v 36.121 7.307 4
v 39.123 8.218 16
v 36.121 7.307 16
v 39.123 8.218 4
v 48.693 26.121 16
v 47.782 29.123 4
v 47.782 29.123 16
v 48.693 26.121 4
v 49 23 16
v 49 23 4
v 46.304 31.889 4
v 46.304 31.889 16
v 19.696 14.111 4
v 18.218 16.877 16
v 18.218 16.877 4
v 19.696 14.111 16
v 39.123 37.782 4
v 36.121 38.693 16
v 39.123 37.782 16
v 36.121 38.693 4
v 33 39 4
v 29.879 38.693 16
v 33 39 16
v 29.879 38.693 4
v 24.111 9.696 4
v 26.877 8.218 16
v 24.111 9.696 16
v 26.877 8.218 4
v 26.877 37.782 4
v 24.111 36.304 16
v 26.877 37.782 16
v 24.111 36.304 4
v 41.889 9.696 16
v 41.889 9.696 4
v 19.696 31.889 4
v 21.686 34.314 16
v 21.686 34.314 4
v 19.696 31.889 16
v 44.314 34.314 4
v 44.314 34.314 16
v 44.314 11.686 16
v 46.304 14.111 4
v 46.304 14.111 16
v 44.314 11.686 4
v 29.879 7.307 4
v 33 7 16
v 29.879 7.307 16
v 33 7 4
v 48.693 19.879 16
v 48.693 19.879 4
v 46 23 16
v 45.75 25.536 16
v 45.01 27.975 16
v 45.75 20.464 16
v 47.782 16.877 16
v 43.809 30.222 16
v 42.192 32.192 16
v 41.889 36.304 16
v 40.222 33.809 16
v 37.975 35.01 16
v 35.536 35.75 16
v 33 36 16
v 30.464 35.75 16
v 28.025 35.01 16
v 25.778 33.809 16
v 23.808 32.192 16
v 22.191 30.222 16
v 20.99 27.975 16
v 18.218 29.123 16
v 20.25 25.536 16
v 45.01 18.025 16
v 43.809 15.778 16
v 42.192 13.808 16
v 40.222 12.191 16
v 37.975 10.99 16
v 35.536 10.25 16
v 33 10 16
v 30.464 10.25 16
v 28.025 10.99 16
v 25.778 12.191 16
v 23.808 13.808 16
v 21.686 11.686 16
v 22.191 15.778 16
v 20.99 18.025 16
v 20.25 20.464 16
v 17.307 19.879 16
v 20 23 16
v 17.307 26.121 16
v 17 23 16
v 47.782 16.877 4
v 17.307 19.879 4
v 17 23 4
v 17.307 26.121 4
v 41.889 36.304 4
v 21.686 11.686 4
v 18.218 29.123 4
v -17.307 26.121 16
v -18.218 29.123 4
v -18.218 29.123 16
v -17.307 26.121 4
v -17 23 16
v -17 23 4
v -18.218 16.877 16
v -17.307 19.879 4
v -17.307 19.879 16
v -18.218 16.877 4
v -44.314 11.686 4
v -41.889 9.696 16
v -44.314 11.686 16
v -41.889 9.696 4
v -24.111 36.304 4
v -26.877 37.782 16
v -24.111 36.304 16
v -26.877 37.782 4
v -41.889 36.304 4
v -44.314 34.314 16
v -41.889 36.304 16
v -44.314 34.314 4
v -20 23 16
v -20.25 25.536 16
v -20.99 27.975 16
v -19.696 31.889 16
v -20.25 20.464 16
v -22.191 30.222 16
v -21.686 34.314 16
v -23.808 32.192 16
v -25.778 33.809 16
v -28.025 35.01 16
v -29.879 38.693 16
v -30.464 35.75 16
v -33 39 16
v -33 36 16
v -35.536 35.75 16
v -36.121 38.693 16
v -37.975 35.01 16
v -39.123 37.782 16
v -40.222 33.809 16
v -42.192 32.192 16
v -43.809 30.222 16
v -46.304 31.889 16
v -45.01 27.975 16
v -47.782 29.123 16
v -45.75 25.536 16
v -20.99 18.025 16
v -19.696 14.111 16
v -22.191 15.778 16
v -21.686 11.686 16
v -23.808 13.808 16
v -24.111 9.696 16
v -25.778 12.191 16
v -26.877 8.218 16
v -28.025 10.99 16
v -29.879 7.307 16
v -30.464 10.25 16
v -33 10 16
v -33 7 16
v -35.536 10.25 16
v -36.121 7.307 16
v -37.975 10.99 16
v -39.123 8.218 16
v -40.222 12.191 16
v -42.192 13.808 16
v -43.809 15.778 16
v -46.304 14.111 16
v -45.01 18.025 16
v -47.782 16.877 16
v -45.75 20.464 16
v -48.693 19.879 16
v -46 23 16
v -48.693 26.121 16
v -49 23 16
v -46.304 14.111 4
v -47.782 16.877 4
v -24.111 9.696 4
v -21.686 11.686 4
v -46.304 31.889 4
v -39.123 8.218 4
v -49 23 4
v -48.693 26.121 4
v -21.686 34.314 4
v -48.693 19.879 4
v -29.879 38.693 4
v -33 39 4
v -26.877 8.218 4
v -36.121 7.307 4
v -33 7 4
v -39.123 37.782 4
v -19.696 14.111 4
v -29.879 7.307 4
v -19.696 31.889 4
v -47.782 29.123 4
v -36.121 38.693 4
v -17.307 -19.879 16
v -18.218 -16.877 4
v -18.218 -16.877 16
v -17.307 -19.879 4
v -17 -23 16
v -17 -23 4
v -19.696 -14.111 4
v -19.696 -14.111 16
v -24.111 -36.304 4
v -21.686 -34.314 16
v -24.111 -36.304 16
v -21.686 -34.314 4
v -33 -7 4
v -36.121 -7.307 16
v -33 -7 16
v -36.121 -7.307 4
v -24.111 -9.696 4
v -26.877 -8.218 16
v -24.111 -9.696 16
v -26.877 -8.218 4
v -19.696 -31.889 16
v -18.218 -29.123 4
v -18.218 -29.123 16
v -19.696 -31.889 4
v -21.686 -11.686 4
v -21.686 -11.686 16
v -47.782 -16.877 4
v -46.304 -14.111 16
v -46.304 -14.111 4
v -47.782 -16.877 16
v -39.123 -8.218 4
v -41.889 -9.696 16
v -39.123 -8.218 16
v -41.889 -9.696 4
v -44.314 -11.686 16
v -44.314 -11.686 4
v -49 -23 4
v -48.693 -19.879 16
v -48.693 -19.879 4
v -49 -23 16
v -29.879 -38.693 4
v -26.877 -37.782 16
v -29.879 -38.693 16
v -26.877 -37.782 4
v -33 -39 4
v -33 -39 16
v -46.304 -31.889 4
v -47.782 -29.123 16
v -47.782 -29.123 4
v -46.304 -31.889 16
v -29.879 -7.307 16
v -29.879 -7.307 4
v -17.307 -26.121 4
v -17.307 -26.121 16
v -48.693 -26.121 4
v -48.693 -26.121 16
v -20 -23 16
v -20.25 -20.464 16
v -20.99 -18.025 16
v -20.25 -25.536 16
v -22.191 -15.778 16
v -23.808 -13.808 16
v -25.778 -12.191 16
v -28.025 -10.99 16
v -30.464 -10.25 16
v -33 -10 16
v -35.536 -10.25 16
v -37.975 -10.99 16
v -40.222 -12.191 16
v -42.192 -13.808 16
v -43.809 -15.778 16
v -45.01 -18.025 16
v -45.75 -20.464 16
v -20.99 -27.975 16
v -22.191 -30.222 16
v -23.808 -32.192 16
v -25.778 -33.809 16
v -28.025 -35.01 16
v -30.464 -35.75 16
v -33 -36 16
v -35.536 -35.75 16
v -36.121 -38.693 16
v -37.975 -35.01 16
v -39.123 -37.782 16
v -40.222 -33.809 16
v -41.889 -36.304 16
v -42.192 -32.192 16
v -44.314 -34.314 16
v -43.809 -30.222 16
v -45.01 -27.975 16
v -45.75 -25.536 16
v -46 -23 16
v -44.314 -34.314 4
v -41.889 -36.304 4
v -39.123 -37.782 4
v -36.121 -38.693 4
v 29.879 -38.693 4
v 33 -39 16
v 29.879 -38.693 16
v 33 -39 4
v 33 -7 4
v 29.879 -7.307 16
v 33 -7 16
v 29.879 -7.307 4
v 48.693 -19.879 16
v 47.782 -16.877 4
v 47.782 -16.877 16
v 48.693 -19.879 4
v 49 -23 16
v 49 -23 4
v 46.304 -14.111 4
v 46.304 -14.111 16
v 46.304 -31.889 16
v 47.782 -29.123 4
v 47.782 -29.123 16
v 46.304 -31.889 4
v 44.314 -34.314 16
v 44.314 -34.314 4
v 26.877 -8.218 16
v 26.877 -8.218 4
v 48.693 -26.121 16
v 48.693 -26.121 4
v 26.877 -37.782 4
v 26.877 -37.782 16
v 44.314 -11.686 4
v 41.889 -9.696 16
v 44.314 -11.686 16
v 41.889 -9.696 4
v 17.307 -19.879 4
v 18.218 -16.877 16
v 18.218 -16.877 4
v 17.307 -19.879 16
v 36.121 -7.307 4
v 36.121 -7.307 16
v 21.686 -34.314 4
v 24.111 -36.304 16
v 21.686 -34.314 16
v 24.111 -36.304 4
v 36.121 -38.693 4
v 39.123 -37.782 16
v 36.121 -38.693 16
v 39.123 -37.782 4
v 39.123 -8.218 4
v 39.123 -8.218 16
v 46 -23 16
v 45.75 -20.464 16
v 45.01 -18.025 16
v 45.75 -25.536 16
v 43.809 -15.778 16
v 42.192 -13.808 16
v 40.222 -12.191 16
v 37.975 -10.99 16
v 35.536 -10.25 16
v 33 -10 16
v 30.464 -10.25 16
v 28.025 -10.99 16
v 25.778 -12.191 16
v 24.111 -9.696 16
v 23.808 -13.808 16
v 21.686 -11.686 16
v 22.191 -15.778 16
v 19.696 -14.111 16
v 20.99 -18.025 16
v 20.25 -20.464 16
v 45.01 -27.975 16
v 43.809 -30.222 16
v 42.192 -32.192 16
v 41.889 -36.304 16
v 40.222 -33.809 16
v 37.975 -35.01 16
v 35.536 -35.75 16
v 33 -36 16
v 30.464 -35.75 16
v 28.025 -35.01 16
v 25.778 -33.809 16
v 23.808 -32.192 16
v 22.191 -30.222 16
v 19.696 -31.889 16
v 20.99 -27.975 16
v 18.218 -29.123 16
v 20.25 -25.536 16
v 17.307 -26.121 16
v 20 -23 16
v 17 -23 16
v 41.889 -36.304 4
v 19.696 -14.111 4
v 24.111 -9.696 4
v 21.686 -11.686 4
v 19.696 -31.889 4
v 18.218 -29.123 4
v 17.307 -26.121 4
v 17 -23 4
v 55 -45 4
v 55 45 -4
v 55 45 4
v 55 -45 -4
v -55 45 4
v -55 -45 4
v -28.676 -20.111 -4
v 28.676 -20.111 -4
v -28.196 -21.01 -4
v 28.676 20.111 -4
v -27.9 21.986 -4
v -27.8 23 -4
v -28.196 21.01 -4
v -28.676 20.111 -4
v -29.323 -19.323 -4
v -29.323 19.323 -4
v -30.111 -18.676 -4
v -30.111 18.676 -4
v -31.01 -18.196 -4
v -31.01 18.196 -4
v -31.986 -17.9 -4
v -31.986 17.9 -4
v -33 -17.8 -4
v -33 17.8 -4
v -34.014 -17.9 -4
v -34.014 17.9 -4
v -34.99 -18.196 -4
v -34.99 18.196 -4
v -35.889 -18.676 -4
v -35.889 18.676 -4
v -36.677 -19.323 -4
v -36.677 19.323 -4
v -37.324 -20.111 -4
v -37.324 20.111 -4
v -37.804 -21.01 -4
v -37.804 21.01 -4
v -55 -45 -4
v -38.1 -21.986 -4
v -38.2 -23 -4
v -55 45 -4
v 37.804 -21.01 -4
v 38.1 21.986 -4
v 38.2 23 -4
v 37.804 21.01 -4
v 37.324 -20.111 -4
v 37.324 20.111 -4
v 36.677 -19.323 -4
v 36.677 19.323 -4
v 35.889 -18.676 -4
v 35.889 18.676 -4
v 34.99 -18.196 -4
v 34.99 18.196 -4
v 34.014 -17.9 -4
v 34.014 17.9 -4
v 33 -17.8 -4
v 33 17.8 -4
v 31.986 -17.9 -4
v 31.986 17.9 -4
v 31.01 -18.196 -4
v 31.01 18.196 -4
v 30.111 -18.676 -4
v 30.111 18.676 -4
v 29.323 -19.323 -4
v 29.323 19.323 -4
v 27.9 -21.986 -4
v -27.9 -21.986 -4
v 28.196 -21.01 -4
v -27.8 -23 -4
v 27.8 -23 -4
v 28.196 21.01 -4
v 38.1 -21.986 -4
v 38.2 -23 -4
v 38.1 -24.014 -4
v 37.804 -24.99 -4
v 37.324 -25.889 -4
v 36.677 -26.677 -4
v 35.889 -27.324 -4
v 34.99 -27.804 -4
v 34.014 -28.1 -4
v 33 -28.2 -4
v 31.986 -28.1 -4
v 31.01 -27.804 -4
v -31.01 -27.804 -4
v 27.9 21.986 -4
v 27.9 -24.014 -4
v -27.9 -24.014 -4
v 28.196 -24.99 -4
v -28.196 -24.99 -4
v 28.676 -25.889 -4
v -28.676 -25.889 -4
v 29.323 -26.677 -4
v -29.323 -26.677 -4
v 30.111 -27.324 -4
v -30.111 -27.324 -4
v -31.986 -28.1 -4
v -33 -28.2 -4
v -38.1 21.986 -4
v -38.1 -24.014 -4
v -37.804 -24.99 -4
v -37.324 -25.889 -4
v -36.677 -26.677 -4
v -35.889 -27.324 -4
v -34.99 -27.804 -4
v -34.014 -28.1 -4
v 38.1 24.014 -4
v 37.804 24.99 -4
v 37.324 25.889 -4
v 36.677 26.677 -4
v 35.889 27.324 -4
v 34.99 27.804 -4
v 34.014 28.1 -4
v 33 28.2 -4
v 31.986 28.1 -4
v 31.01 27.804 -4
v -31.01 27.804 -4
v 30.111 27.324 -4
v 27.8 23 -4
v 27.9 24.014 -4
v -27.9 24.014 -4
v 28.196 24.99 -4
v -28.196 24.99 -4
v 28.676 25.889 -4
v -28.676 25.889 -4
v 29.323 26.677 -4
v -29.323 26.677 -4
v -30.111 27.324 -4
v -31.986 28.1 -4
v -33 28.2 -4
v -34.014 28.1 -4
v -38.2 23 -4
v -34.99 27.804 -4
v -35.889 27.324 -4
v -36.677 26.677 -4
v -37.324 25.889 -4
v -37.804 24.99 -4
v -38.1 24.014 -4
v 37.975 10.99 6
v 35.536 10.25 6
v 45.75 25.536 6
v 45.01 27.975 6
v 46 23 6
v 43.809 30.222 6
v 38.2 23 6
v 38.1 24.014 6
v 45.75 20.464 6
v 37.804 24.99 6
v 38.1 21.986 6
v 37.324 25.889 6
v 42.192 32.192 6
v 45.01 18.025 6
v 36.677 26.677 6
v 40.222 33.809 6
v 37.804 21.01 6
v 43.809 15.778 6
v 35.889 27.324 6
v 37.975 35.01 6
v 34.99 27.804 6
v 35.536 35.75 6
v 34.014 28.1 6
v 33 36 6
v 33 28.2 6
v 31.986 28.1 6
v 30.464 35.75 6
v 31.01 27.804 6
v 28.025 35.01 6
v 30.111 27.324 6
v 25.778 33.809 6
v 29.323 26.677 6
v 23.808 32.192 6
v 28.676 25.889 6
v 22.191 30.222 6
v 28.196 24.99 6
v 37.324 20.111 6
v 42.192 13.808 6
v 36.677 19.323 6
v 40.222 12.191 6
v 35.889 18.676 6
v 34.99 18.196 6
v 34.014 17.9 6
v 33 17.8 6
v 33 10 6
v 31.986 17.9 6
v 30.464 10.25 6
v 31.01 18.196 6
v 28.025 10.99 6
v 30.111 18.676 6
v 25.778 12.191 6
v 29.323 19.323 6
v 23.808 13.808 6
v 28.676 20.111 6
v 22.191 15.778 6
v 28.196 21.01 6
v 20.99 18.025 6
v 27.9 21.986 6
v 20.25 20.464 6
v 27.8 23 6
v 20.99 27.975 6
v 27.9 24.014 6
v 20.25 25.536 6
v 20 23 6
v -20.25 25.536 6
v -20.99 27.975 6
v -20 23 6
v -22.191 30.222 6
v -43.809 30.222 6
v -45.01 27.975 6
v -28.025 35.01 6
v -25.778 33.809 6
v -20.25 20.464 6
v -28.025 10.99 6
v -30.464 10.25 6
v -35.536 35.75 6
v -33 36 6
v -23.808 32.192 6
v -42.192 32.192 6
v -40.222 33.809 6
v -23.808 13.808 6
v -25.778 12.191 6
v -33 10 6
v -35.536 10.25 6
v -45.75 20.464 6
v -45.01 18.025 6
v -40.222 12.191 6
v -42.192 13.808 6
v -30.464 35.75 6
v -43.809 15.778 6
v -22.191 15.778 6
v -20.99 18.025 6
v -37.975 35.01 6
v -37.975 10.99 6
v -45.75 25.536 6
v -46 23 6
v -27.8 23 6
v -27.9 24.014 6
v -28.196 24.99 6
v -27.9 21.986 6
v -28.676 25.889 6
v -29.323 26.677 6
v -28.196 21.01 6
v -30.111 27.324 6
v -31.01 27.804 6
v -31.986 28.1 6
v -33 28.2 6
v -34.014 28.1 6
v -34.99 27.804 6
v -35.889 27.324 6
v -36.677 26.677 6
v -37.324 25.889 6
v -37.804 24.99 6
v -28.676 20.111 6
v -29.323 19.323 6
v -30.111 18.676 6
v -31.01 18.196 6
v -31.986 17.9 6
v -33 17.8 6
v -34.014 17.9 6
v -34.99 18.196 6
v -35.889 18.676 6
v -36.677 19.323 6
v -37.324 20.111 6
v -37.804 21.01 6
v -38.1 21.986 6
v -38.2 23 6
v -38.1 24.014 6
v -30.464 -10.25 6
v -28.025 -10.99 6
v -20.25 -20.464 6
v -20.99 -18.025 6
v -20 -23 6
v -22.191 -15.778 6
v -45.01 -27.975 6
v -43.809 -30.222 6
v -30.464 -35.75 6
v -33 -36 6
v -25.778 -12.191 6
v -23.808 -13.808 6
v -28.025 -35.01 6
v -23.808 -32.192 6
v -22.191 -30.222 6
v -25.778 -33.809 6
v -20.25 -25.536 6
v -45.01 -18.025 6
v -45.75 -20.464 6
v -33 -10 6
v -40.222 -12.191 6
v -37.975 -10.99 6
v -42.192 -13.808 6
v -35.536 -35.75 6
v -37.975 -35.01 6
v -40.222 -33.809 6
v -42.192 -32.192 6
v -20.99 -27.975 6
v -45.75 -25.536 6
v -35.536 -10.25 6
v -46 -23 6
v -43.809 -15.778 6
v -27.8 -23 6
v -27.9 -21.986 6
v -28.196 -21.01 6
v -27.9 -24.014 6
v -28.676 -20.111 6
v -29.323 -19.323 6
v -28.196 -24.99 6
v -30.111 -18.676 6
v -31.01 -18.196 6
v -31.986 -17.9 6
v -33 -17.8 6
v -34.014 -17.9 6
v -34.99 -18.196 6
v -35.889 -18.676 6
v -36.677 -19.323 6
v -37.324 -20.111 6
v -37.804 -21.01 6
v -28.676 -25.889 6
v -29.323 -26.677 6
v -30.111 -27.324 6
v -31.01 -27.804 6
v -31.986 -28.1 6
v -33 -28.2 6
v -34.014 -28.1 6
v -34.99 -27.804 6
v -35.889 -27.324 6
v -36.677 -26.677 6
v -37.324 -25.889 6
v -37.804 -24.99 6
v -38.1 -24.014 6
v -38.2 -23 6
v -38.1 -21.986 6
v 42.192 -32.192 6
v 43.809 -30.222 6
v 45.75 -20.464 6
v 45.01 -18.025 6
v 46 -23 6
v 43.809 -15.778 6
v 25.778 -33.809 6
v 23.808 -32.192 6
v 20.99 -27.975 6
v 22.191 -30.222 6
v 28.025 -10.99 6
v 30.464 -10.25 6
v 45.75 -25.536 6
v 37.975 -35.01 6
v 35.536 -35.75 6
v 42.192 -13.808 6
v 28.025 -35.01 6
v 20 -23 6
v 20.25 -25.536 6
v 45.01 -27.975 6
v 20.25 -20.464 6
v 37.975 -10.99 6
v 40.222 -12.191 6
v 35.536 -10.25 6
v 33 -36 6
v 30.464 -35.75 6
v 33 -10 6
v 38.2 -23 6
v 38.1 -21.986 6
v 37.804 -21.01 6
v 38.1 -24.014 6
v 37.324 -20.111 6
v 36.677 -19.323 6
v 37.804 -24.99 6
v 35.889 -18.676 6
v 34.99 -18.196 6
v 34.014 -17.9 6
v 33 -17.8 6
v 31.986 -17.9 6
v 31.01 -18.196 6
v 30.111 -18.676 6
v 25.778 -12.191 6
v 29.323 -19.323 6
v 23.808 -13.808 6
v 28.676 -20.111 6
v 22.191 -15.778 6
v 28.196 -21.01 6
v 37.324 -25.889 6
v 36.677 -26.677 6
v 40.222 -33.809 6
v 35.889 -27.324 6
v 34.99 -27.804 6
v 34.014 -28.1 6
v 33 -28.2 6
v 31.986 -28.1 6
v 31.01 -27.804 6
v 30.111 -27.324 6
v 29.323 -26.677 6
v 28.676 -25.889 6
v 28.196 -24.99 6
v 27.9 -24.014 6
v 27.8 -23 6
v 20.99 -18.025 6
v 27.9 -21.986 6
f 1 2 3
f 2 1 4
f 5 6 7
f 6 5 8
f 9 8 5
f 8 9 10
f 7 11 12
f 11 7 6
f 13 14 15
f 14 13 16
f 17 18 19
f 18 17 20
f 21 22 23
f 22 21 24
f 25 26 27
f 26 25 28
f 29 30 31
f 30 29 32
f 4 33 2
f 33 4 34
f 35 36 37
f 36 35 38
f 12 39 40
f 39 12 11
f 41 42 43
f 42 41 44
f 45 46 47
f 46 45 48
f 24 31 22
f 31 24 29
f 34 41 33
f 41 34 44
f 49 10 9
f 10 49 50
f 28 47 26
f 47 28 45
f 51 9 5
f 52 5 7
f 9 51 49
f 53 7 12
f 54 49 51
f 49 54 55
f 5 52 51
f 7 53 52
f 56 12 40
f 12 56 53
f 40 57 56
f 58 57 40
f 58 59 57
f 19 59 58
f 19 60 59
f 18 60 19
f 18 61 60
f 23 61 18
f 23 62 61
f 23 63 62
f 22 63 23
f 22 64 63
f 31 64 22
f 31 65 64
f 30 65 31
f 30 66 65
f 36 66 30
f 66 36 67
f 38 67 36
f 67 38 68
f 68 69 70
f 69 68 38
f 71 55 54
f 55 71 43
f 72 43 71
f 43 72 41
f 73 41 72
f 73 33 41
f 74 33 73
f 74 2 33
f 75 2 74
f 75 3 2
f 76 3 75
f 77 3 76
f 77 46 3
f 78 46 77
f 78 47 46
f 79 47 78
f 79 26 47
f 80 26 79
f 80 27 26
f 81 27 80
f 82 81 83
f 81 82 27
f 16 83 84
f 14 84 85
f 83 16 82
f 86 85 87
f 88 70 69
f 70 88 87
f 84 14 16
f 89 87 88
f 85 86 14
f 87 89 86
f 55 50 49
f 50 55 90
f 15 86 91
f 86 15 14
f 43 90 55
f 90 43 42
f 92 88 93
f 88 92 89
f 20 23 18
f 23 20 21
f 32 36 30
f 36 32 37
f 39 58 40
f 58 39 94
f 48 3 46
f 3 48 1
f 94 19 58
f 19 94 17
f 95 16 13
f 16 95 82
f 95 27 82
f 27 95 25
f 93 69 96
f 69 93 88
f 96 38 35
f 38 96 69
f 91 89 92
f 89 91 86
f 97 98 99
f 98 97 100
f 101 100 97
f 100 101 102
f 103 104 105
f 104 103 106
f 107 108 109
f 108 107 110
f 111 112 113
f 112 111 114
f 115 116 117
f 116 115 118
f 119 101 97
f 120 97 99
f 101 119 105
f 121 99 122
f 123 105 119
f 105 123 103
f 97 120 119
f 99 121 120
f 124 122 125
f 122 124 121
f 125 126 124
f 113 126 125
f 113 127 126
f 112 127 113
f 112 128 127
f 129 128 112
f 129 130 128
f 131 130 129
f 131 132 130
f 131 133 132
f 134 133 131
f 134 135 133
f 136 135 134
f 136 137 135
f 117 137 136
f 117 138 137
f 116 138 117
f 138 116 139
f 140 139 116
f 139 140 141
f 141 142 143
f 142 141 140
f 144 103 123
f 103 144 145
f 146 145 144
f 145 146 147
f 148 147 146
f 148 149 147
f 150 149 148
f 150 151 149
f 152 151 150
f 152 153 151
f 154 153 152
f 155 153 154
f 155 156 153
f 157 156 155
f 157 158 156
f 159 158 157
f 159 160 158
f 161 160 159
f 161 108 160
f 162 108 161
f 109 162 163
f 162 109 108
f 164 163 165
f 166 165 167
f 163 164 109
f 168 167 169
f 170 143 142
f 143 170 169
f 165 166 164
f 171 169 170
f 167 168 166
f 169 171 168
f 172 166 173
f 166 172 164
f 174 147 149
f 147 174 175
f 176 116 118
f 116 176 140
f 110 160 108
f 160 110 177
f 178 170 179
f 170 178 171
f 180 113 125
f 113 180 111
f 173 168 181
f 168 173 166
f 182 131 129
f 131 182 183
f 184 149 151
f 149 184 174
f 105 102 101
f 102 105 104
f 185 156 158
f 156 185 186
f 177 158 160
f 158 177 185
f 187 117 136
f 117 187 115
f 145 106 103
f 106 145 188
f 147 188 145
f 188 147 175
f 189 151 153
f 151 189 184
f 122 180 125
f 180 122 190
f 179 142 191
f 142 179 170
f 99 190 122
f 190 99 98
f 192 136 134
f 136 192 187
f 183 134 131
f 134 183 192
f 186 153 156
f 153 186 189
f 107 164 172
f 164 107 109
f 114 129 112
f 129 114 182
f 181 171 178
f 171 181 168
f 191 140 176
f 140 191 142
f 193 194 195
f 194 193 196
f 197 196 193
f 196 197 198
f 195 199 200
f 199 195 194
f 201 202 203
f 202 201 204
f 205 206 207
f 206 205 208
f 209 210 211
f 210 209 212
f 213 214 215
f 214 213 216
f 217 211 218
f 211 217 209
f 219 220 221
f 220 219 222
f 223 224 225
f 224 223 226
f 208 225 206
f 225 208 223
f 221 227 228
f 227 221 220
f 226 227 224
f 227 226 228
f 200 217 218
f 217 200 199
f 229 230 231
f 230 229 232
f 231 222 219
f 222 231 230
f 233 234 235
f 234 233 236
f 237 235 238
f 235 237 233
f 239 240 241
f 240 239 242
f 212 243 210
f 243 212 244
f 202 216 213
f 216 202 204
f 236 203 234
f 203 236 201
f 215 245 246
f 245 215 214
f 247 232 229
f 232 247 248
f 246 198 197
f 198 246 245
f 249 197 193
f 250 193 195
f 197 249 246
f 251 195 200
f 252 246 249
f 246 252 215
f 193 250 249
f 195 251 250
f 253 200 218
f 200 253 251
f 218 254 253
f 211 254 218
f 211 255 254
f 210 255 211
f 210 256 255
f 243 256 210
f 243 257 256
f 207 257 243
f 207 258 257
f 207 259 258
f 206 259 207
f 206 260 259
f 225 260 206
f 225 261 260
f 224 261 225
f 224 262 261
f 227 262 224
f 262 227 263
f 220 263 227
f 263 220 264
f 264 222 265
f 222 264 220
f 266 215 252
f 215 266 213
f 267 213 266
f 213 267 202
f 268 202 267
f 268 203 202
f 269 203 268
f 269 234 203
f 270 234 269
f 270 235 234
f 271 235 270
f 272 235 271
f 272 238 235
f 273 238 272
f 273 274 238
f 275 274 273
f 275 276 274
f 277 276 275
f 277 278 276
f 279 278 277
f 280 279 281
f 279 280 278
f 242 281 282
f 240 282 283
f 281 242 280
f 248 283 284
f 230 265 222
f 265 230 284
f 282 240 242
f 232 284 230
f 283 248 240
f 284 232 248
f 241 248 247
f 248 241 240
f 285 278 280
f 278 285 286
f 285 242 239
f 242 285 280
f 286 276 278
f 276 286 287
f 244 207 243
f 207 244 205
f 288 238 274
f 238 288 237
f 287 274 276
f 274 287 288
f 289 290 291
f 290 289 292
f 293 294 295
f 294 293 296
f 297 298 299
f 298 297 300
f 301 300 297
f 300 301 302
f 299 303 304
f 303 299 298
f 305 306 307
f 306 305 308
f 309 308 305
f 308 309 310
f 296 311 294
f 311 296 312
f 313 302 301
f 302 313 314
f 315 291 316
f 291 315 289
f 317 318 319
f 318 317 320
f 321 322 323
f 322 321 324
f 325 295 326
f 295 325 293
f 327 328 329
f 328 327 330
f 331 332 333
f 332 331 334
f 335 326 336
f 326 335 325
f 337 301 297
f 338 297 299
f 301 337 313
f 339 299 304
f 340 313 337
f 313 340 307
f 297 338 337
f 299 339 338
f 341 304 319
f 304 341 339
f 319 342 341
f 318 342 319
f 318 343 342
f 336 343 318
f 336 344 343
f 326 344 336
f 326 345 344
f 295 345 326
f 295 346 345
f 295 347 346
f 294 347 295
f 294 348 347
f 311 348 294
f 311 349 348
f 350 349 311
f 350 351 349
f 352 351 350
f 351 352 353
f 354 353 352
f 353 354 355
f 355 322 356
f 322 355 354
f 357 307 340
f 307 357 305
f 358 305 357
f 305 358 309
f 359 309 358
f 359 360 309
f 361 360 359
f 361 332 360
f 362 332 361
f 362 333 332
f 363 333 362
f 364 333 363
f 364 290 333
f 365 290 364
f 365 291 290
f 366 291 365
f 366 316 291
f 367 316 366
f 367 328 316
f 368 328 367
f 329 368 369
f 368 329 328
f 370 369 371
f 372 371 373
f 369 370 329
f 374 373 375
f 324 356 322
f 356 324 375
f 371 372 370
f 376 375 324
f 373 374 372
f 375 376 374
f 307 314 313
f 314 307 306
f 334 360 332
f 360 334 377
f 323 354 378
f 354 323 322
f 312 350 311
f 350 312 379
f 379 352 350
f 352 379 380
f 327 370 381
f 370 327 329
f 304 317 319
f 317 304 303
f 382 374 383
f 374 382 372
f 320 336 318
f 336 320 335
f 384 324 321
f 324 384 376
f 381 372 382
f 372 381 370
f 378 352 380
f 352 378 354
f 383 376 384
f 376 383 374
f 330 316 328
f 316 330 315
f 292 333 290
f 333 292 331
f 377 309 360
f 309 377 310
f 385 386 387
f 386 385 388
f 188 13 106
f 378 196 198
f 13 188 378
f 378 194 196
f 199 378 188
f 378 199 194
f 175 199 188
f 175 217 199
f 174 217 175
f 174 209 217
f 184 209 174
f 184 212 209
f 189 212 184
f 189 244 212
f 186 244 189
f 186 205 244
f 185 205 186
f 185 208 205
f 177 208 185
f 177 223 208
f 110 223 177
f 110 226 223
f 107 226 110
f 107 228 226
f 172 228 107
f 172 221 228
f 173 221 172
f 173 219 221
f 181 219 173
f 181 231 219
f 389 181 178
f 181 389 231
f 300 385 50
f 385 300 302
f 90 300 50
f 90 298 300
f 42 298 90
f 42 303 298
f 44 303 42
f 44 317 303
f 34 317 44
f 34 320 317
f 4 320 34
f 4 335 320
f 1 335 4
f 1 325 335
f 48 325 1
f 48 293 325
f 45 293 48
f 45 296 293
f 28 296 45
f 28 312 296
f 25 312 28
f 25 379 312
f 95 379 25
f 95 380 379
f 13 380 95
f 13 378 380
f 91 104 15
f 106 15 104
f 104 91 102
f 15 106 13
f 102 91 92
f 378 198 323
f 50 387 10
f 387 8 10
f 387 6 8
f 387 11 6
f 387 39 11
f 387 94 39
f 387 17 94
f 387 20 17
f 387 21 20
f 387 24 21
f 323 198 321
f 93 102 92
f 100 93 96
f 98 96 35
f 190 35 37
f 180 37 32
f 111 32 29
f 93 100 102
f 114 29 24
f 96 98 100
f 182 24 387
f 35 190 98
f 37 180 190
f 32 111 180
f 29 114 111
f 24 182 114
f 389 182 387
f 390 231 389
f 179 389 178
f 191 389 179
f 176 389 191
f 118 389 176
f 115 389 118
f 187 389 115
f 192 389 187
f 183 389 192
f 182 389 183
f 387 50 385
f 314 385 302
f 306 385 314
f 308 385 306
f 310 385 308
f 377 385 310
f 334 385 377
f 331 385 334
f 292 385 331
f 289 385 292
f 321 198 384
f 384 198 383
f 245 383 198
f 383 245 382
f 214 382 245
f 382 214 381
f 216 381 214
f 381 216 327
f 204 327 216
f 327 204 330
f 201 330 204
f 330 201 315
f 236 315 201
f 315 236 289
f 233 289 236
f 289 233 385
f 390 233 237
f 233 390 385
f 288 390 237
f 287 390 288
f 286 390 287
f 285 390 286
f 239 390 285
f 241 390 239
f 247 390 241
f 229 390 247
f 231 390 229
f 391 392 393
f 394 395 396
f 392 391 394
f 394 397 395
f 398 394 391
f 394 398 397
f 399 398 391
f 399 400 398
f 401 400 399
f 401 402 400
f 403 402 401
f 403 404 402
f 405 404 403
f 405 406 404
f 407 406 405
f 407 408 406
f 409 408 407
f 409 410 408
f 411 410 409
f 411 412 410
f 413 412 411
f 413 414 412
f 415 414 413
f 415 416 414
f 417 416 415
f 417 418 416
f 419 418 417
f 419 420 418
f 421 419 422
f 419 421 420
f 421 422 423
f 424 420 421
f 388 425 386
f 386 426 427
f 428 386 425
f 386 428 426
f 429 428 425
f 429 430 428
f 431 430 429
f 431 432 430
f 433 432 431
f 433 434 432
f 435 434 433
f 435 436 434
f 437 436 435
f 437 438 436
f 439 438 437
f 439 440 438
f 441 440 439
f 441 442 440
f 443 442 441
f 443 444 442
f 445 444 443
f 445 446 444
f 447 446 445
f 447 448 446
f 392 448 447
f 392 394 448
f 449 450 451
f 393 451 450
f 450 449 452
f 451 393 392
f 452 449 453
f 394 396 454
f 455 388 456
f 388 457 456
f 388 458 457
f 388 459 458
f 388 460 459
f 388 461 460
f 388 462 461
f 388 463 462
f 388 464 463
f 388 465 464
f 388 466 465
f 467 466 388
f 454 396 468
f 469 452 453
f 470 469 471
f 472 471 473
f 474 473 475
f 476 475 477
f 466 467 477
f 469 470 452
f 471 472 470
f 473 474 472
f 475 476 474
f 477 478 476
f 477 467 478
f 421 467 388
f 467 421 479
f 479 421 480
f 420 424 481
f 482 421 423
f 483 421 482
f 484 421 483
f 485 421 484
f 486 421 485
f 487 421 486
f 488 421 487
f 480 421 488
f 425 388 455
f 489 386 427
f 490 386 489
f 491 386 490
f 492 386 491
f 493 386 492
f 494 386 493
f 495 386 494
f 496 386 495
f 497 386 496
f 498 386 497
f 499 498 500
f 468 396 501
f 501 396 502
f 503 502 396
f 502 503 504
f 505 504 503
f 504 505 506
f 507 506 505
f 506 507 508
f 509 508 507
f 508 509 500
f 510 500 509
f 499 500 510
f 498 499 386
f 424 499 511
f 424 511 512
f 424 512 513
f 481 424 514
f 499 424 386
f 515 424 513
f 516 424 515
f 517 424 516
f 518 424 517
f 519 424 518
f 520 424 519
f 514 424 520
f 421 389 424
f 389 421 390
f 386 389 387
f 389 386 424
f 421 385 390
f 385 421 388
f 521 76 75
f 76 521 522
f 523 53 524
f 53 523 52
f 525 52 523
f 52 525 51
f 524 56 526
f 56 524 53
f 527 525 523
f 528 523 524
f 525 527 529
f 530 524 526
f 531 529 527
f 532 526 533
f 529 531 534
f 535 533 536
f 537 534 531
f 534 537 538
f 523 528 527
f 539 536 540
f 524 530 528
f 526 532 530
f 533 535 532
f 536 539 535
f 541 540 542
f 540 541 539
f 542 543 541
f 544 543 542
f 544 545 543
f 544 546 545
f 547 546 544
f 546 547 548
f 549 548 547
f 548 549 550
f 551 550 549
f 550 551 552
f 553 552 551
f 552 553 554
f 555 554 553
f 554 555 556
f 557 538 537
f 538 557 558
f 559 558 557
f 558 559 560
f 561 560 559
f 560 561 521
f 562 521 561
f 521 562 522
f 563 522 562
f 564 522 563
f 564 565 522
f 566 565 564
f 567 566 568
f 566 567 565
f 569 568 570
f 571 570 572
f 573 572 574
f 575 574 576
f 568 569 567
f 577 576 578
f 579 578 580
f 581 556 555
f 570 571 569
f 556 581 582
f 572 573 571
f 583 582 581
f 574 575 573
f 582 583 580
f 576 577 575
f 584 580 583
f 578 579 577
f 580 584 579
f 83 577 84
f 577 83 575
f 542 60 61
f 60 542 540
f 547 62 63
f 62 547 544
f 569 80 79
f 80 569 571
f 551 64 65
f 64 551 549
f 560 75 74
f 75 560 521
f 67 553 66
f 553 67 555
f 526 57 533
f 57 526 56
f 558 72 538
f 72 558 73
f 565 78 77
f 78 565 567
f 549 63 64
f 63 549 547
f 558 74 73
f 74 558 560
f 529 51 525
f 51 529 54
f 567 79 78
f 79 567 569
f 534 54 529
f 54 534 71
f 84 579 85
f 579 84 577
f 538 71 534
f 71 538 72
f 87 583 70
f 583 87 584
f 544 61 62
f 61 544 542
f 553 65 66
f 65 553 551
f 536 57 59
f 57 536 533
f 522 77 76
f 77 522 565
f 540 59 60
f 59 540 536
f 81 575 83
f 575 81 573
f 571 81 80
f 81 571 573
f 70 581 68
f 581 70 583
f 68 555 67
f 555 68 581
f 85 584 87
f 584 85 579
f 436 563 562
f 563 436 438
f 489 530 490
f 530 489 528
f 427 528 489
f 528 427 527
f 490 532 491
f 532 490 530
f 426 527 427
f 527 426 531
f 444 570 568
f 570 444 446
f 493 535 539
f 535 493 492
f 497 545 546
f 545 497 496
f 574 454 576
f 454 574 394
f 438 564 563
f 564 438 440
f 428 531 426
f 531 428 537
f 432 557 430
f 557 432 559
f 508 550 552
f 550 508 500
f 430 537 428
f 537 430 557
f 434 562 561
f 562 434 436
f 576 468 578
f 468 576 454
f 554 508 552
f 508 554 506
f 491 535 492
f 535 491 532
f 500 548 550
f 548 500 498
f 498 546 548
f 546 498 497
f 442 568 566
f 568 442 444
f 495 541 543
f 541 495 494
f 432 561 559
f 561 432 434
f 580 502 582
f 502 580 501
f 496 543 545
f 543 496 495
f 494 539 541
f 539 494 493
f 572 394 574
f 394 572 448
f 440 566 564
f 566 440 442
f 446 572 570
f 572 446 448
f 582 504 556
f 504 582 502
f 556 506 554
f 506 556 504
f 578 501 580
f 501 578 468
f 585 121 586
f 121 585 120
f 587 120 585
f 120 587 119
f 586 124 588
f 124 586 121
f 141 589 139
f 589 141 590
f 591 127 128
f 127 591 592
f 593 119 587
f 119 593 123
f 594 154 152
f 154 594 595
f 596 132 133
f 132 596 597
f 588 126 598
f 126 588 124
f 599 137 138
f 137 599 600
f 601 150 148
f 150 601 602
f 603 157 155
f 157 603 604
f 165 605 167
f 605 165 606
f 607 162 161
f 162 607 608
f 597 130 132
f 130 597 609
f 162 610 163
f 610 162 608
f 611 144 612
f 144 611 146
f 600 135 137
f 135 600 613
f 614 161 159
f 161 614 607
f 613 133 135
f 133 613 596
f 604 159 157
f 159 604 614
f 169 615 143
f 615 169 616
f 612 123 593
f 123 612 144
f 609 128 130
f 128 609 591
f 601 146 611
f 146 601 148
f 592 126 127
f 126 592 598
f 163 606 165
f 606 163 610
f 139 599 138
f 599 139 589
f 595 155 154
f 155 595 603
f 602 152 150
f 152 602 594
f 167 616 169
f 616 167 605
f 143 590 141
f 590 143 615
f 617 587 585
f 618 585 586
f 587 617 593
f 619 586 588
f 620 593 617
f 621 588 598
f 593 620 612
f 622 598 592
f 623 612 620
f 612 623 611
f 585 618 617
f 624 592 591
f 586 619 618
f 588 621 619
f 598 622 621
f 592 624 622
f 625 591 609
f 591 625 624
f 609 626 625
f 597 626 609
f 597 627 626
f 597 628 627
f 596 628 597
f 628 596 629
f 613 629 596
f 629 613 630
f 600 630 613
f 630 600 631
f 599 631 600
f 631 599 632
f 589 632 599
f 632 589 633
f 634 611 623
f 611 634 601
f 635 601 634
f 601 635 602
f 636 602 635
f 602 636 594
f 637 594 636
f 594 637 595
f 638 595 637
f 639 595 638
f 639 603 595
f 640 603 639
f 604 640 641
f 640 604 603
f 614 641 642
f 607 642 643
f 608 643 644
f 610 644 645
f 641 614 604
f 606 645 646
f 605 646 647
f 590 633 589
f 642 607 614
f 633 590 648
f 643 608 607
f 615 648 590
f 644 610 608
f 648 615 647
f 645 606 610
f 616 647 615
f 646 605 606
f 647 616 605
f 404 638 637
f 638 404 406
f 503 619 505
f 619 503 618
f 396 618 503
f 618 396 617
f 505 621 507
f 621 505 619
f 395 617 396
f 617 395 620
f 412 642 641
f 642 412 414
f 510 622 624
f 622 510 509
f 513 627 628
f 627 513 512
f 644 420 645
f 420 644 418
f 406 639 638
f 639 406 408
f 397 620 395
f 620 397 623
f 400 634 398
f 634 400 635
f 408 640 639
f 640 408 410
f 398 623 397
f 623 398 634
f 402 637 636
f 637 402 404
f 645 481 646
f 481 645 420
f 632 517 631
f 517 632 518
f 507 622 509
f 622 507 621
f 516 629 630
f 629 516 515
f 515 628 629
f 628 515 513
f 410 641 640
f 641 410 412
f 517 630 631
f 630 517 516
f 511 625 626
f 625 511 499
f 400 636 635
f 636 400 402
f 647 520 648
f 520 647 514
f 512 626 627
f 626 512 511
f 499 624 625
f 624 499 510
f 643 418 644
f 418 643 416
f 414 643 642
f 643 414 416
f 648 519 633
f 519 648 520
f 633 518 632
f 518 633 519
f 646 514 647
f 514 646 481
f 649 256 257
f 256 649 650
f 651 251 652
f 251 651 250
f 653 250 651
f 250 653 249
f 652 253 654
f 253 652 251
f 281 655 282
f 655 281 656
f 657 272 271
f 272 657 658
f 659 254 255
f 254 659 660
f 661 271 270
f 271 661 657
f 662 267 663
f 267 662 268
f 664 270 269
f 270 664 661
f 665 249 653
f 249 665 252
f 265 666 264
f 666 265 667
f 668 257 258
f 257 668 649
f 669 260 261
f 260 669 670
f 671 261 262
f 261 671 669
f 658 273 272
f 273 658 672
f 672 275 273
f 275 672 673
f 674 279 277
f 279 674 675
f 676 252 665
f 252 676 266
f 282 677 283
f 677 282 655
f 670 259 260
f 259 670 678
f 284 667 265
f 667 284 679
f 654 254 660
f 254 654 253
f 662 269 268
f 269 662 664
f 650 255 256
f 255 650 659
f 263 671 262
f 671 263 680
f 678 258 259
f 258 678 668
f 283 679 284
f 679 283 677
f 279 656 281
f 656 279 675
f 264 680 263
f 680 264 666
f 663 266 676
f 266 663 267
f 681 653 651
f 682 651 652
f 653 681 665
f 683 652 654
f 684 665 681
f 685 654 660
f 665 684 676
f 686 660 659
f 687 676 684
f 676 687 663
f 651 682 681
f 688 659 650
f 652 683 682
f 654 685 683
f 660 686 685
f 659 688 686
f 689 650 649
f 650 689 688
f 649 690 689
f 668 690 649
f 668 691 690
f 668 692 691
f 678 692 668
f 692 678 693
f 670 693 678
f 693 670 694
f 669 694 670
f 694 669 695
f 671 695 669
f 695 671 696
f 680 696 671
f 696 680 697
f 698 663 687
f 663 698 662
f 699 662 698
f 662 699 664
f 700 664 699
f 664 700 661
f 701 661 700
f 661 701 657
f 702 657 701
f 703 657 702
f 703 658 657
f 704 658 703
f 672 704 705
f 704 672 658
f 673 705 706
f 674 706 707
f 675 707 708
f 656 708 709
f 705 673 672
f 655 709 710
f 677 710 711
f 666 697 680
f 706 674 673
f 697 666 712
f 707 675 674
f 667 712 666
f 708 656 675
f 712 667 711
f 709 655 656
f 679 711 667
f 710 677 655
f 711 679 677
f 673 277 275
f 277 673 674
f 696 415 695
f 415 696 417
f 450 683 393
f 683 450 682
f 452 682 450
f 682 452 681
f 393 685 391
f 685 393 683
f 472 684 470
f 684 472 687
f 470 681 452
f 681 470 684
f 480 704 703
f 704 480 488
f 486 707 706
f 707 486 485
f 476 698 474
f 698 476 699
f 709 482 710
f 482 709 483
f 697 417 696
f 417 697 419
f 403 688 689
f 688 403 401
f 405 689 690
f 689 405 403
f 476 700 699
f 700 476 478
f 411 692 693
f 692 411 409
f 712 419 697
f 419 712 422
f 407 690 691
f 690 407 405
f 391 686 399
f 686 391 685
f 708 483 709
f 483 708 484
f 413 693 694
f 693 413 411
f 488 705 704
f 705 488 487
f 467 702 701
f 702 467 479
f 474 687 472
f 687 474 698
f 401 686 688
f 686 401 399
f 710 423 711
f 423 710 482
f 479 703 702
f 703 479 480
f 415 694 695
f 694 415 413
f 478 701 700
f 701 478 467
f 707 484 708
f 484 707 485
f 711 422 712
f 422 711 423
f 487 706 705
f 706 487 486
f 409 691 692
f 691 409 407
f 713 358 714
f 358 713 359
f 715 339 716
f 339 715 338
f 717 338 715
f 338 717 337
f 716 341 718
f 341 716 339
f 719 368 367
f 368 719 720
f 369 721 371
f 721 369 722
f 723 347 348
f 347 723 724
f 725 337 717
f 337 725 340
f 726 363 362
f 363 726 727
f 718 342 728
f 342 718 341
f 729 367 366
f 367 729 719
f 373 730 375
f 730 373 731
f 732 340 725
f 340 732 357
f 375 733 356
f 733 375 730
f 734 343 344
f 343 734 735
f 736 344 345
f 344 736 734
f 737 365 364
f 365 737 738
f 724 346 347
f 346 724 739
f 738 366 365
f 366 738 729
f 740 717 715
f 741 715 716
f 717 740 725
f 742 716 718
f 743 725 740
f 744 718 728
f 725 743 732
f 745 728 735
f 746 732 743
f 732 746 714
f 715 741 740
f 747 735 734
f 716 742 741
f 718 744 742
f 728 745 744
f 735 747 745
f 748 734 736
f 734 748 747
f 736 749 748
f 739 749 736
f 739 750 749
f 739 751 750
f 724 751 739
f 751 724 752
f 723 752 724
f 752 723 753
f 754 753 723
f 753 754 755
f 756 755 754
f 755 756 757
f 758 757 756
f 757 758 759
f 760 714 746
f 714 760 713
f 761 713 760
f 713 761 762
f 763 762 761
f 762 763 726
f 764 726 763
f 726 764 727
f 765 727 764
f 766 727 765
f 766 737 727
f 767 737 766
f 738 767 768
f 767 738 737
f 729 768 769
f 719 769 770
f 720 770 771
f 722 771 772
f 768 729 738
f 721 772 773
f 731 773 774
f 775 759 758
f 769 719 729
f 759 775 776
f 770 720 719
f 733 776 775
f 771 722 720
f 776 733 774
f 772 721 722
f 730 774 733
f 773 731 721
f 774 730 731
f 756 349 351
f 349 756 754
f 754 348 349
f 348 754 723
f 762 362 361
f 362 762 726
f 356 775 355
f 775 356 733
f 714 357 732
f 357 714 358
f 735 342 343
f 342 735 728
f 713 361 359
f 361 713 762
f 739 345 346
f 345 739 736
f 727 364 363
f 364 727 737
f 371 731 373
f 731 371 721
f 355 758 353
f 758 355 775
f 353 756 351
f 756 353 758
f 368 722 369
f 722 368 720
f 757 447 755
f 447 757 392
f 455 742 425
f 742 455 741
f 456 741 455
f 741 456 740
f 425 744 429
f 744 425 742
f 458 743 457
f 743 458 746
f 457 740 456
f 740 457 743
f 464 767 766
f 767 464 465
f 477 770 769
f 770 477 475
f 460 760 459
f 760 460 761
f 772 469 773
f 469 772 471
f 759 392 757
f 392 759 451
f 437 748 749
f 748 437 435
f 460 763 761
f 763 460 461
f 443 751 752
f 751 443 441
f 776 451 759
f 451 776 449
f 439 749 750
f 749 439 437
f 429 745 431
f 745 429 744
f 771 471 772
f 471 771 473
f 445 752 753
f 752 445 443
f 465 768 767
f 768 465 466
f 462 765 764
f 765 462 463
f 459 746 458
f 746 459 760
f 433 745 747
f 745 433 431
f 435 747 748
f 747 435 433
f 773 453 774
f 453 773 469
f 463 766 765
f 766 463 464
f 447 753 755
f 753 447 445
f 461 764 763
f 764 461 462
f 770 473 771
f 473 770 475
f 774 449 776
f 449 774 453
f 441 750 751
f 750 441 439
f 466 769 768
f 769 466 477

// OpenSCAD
$fn = 32;

// ----------------------------------------------------------------------
// Socket pad plate
// bosses with counterbored sockets for the screws
// ----------------------------------------------------------------------

// --- parameters (mm) ---
base_t = 8;            // base plate thickness
boss_h = 12;           // boss height above the base plate
boss_d = 32;           // boss diameter
socket_d = 26;         // socket diameter
socket_depth = 10;     // socket depth from the boss face
bolt_d = 10.4;         // screw clearance hole through the socket floor
plate = [110, 90, 8];  // overall size (x, y, z)
edge = 22;             // boss centre offset from the plate edge
pads = 4;              // boss count, one per corner

// --- derived feature positions (mm) ---
height = base_t + boss_h;        // = 20   overall height of the part
corner_x = plate[0] / 2 - edge;  // = 33   boss centre X
corner_y = plate[1] / 2 - edge;  // = 23   boss centre Y
feature_centers = [
  [corner_x, corner_y],
  [-corner_x, corner_y],
  [-corner_x, -corner_y],
  [corner_x, -corner_y]
];   // boss centres: sockets, holes and the pads themselves are placed from here

// base plate, bosses on feature_centers, socket + through hole in each
difference() {
  union() {
    cube(plate, center = true);
    for (centre = feature_centers)
      translate([centre[0], centre[1], plate[2] / 2 - 1])
        cylinder(d = boss_d, h = boss_h + 1);
  }
  for (centre = feature_centers) {
    translate([centre[0], centre[1], plate[2] / 2 + boss_h - socket_depth])
      cylinder(d = socket_d, h = socket_depth + 1);
    translate([centre[0], centre[1], -height])
      cylinder(d = bolt_d, h = 2 * height + 2);  // through the socket floor
  }
}
